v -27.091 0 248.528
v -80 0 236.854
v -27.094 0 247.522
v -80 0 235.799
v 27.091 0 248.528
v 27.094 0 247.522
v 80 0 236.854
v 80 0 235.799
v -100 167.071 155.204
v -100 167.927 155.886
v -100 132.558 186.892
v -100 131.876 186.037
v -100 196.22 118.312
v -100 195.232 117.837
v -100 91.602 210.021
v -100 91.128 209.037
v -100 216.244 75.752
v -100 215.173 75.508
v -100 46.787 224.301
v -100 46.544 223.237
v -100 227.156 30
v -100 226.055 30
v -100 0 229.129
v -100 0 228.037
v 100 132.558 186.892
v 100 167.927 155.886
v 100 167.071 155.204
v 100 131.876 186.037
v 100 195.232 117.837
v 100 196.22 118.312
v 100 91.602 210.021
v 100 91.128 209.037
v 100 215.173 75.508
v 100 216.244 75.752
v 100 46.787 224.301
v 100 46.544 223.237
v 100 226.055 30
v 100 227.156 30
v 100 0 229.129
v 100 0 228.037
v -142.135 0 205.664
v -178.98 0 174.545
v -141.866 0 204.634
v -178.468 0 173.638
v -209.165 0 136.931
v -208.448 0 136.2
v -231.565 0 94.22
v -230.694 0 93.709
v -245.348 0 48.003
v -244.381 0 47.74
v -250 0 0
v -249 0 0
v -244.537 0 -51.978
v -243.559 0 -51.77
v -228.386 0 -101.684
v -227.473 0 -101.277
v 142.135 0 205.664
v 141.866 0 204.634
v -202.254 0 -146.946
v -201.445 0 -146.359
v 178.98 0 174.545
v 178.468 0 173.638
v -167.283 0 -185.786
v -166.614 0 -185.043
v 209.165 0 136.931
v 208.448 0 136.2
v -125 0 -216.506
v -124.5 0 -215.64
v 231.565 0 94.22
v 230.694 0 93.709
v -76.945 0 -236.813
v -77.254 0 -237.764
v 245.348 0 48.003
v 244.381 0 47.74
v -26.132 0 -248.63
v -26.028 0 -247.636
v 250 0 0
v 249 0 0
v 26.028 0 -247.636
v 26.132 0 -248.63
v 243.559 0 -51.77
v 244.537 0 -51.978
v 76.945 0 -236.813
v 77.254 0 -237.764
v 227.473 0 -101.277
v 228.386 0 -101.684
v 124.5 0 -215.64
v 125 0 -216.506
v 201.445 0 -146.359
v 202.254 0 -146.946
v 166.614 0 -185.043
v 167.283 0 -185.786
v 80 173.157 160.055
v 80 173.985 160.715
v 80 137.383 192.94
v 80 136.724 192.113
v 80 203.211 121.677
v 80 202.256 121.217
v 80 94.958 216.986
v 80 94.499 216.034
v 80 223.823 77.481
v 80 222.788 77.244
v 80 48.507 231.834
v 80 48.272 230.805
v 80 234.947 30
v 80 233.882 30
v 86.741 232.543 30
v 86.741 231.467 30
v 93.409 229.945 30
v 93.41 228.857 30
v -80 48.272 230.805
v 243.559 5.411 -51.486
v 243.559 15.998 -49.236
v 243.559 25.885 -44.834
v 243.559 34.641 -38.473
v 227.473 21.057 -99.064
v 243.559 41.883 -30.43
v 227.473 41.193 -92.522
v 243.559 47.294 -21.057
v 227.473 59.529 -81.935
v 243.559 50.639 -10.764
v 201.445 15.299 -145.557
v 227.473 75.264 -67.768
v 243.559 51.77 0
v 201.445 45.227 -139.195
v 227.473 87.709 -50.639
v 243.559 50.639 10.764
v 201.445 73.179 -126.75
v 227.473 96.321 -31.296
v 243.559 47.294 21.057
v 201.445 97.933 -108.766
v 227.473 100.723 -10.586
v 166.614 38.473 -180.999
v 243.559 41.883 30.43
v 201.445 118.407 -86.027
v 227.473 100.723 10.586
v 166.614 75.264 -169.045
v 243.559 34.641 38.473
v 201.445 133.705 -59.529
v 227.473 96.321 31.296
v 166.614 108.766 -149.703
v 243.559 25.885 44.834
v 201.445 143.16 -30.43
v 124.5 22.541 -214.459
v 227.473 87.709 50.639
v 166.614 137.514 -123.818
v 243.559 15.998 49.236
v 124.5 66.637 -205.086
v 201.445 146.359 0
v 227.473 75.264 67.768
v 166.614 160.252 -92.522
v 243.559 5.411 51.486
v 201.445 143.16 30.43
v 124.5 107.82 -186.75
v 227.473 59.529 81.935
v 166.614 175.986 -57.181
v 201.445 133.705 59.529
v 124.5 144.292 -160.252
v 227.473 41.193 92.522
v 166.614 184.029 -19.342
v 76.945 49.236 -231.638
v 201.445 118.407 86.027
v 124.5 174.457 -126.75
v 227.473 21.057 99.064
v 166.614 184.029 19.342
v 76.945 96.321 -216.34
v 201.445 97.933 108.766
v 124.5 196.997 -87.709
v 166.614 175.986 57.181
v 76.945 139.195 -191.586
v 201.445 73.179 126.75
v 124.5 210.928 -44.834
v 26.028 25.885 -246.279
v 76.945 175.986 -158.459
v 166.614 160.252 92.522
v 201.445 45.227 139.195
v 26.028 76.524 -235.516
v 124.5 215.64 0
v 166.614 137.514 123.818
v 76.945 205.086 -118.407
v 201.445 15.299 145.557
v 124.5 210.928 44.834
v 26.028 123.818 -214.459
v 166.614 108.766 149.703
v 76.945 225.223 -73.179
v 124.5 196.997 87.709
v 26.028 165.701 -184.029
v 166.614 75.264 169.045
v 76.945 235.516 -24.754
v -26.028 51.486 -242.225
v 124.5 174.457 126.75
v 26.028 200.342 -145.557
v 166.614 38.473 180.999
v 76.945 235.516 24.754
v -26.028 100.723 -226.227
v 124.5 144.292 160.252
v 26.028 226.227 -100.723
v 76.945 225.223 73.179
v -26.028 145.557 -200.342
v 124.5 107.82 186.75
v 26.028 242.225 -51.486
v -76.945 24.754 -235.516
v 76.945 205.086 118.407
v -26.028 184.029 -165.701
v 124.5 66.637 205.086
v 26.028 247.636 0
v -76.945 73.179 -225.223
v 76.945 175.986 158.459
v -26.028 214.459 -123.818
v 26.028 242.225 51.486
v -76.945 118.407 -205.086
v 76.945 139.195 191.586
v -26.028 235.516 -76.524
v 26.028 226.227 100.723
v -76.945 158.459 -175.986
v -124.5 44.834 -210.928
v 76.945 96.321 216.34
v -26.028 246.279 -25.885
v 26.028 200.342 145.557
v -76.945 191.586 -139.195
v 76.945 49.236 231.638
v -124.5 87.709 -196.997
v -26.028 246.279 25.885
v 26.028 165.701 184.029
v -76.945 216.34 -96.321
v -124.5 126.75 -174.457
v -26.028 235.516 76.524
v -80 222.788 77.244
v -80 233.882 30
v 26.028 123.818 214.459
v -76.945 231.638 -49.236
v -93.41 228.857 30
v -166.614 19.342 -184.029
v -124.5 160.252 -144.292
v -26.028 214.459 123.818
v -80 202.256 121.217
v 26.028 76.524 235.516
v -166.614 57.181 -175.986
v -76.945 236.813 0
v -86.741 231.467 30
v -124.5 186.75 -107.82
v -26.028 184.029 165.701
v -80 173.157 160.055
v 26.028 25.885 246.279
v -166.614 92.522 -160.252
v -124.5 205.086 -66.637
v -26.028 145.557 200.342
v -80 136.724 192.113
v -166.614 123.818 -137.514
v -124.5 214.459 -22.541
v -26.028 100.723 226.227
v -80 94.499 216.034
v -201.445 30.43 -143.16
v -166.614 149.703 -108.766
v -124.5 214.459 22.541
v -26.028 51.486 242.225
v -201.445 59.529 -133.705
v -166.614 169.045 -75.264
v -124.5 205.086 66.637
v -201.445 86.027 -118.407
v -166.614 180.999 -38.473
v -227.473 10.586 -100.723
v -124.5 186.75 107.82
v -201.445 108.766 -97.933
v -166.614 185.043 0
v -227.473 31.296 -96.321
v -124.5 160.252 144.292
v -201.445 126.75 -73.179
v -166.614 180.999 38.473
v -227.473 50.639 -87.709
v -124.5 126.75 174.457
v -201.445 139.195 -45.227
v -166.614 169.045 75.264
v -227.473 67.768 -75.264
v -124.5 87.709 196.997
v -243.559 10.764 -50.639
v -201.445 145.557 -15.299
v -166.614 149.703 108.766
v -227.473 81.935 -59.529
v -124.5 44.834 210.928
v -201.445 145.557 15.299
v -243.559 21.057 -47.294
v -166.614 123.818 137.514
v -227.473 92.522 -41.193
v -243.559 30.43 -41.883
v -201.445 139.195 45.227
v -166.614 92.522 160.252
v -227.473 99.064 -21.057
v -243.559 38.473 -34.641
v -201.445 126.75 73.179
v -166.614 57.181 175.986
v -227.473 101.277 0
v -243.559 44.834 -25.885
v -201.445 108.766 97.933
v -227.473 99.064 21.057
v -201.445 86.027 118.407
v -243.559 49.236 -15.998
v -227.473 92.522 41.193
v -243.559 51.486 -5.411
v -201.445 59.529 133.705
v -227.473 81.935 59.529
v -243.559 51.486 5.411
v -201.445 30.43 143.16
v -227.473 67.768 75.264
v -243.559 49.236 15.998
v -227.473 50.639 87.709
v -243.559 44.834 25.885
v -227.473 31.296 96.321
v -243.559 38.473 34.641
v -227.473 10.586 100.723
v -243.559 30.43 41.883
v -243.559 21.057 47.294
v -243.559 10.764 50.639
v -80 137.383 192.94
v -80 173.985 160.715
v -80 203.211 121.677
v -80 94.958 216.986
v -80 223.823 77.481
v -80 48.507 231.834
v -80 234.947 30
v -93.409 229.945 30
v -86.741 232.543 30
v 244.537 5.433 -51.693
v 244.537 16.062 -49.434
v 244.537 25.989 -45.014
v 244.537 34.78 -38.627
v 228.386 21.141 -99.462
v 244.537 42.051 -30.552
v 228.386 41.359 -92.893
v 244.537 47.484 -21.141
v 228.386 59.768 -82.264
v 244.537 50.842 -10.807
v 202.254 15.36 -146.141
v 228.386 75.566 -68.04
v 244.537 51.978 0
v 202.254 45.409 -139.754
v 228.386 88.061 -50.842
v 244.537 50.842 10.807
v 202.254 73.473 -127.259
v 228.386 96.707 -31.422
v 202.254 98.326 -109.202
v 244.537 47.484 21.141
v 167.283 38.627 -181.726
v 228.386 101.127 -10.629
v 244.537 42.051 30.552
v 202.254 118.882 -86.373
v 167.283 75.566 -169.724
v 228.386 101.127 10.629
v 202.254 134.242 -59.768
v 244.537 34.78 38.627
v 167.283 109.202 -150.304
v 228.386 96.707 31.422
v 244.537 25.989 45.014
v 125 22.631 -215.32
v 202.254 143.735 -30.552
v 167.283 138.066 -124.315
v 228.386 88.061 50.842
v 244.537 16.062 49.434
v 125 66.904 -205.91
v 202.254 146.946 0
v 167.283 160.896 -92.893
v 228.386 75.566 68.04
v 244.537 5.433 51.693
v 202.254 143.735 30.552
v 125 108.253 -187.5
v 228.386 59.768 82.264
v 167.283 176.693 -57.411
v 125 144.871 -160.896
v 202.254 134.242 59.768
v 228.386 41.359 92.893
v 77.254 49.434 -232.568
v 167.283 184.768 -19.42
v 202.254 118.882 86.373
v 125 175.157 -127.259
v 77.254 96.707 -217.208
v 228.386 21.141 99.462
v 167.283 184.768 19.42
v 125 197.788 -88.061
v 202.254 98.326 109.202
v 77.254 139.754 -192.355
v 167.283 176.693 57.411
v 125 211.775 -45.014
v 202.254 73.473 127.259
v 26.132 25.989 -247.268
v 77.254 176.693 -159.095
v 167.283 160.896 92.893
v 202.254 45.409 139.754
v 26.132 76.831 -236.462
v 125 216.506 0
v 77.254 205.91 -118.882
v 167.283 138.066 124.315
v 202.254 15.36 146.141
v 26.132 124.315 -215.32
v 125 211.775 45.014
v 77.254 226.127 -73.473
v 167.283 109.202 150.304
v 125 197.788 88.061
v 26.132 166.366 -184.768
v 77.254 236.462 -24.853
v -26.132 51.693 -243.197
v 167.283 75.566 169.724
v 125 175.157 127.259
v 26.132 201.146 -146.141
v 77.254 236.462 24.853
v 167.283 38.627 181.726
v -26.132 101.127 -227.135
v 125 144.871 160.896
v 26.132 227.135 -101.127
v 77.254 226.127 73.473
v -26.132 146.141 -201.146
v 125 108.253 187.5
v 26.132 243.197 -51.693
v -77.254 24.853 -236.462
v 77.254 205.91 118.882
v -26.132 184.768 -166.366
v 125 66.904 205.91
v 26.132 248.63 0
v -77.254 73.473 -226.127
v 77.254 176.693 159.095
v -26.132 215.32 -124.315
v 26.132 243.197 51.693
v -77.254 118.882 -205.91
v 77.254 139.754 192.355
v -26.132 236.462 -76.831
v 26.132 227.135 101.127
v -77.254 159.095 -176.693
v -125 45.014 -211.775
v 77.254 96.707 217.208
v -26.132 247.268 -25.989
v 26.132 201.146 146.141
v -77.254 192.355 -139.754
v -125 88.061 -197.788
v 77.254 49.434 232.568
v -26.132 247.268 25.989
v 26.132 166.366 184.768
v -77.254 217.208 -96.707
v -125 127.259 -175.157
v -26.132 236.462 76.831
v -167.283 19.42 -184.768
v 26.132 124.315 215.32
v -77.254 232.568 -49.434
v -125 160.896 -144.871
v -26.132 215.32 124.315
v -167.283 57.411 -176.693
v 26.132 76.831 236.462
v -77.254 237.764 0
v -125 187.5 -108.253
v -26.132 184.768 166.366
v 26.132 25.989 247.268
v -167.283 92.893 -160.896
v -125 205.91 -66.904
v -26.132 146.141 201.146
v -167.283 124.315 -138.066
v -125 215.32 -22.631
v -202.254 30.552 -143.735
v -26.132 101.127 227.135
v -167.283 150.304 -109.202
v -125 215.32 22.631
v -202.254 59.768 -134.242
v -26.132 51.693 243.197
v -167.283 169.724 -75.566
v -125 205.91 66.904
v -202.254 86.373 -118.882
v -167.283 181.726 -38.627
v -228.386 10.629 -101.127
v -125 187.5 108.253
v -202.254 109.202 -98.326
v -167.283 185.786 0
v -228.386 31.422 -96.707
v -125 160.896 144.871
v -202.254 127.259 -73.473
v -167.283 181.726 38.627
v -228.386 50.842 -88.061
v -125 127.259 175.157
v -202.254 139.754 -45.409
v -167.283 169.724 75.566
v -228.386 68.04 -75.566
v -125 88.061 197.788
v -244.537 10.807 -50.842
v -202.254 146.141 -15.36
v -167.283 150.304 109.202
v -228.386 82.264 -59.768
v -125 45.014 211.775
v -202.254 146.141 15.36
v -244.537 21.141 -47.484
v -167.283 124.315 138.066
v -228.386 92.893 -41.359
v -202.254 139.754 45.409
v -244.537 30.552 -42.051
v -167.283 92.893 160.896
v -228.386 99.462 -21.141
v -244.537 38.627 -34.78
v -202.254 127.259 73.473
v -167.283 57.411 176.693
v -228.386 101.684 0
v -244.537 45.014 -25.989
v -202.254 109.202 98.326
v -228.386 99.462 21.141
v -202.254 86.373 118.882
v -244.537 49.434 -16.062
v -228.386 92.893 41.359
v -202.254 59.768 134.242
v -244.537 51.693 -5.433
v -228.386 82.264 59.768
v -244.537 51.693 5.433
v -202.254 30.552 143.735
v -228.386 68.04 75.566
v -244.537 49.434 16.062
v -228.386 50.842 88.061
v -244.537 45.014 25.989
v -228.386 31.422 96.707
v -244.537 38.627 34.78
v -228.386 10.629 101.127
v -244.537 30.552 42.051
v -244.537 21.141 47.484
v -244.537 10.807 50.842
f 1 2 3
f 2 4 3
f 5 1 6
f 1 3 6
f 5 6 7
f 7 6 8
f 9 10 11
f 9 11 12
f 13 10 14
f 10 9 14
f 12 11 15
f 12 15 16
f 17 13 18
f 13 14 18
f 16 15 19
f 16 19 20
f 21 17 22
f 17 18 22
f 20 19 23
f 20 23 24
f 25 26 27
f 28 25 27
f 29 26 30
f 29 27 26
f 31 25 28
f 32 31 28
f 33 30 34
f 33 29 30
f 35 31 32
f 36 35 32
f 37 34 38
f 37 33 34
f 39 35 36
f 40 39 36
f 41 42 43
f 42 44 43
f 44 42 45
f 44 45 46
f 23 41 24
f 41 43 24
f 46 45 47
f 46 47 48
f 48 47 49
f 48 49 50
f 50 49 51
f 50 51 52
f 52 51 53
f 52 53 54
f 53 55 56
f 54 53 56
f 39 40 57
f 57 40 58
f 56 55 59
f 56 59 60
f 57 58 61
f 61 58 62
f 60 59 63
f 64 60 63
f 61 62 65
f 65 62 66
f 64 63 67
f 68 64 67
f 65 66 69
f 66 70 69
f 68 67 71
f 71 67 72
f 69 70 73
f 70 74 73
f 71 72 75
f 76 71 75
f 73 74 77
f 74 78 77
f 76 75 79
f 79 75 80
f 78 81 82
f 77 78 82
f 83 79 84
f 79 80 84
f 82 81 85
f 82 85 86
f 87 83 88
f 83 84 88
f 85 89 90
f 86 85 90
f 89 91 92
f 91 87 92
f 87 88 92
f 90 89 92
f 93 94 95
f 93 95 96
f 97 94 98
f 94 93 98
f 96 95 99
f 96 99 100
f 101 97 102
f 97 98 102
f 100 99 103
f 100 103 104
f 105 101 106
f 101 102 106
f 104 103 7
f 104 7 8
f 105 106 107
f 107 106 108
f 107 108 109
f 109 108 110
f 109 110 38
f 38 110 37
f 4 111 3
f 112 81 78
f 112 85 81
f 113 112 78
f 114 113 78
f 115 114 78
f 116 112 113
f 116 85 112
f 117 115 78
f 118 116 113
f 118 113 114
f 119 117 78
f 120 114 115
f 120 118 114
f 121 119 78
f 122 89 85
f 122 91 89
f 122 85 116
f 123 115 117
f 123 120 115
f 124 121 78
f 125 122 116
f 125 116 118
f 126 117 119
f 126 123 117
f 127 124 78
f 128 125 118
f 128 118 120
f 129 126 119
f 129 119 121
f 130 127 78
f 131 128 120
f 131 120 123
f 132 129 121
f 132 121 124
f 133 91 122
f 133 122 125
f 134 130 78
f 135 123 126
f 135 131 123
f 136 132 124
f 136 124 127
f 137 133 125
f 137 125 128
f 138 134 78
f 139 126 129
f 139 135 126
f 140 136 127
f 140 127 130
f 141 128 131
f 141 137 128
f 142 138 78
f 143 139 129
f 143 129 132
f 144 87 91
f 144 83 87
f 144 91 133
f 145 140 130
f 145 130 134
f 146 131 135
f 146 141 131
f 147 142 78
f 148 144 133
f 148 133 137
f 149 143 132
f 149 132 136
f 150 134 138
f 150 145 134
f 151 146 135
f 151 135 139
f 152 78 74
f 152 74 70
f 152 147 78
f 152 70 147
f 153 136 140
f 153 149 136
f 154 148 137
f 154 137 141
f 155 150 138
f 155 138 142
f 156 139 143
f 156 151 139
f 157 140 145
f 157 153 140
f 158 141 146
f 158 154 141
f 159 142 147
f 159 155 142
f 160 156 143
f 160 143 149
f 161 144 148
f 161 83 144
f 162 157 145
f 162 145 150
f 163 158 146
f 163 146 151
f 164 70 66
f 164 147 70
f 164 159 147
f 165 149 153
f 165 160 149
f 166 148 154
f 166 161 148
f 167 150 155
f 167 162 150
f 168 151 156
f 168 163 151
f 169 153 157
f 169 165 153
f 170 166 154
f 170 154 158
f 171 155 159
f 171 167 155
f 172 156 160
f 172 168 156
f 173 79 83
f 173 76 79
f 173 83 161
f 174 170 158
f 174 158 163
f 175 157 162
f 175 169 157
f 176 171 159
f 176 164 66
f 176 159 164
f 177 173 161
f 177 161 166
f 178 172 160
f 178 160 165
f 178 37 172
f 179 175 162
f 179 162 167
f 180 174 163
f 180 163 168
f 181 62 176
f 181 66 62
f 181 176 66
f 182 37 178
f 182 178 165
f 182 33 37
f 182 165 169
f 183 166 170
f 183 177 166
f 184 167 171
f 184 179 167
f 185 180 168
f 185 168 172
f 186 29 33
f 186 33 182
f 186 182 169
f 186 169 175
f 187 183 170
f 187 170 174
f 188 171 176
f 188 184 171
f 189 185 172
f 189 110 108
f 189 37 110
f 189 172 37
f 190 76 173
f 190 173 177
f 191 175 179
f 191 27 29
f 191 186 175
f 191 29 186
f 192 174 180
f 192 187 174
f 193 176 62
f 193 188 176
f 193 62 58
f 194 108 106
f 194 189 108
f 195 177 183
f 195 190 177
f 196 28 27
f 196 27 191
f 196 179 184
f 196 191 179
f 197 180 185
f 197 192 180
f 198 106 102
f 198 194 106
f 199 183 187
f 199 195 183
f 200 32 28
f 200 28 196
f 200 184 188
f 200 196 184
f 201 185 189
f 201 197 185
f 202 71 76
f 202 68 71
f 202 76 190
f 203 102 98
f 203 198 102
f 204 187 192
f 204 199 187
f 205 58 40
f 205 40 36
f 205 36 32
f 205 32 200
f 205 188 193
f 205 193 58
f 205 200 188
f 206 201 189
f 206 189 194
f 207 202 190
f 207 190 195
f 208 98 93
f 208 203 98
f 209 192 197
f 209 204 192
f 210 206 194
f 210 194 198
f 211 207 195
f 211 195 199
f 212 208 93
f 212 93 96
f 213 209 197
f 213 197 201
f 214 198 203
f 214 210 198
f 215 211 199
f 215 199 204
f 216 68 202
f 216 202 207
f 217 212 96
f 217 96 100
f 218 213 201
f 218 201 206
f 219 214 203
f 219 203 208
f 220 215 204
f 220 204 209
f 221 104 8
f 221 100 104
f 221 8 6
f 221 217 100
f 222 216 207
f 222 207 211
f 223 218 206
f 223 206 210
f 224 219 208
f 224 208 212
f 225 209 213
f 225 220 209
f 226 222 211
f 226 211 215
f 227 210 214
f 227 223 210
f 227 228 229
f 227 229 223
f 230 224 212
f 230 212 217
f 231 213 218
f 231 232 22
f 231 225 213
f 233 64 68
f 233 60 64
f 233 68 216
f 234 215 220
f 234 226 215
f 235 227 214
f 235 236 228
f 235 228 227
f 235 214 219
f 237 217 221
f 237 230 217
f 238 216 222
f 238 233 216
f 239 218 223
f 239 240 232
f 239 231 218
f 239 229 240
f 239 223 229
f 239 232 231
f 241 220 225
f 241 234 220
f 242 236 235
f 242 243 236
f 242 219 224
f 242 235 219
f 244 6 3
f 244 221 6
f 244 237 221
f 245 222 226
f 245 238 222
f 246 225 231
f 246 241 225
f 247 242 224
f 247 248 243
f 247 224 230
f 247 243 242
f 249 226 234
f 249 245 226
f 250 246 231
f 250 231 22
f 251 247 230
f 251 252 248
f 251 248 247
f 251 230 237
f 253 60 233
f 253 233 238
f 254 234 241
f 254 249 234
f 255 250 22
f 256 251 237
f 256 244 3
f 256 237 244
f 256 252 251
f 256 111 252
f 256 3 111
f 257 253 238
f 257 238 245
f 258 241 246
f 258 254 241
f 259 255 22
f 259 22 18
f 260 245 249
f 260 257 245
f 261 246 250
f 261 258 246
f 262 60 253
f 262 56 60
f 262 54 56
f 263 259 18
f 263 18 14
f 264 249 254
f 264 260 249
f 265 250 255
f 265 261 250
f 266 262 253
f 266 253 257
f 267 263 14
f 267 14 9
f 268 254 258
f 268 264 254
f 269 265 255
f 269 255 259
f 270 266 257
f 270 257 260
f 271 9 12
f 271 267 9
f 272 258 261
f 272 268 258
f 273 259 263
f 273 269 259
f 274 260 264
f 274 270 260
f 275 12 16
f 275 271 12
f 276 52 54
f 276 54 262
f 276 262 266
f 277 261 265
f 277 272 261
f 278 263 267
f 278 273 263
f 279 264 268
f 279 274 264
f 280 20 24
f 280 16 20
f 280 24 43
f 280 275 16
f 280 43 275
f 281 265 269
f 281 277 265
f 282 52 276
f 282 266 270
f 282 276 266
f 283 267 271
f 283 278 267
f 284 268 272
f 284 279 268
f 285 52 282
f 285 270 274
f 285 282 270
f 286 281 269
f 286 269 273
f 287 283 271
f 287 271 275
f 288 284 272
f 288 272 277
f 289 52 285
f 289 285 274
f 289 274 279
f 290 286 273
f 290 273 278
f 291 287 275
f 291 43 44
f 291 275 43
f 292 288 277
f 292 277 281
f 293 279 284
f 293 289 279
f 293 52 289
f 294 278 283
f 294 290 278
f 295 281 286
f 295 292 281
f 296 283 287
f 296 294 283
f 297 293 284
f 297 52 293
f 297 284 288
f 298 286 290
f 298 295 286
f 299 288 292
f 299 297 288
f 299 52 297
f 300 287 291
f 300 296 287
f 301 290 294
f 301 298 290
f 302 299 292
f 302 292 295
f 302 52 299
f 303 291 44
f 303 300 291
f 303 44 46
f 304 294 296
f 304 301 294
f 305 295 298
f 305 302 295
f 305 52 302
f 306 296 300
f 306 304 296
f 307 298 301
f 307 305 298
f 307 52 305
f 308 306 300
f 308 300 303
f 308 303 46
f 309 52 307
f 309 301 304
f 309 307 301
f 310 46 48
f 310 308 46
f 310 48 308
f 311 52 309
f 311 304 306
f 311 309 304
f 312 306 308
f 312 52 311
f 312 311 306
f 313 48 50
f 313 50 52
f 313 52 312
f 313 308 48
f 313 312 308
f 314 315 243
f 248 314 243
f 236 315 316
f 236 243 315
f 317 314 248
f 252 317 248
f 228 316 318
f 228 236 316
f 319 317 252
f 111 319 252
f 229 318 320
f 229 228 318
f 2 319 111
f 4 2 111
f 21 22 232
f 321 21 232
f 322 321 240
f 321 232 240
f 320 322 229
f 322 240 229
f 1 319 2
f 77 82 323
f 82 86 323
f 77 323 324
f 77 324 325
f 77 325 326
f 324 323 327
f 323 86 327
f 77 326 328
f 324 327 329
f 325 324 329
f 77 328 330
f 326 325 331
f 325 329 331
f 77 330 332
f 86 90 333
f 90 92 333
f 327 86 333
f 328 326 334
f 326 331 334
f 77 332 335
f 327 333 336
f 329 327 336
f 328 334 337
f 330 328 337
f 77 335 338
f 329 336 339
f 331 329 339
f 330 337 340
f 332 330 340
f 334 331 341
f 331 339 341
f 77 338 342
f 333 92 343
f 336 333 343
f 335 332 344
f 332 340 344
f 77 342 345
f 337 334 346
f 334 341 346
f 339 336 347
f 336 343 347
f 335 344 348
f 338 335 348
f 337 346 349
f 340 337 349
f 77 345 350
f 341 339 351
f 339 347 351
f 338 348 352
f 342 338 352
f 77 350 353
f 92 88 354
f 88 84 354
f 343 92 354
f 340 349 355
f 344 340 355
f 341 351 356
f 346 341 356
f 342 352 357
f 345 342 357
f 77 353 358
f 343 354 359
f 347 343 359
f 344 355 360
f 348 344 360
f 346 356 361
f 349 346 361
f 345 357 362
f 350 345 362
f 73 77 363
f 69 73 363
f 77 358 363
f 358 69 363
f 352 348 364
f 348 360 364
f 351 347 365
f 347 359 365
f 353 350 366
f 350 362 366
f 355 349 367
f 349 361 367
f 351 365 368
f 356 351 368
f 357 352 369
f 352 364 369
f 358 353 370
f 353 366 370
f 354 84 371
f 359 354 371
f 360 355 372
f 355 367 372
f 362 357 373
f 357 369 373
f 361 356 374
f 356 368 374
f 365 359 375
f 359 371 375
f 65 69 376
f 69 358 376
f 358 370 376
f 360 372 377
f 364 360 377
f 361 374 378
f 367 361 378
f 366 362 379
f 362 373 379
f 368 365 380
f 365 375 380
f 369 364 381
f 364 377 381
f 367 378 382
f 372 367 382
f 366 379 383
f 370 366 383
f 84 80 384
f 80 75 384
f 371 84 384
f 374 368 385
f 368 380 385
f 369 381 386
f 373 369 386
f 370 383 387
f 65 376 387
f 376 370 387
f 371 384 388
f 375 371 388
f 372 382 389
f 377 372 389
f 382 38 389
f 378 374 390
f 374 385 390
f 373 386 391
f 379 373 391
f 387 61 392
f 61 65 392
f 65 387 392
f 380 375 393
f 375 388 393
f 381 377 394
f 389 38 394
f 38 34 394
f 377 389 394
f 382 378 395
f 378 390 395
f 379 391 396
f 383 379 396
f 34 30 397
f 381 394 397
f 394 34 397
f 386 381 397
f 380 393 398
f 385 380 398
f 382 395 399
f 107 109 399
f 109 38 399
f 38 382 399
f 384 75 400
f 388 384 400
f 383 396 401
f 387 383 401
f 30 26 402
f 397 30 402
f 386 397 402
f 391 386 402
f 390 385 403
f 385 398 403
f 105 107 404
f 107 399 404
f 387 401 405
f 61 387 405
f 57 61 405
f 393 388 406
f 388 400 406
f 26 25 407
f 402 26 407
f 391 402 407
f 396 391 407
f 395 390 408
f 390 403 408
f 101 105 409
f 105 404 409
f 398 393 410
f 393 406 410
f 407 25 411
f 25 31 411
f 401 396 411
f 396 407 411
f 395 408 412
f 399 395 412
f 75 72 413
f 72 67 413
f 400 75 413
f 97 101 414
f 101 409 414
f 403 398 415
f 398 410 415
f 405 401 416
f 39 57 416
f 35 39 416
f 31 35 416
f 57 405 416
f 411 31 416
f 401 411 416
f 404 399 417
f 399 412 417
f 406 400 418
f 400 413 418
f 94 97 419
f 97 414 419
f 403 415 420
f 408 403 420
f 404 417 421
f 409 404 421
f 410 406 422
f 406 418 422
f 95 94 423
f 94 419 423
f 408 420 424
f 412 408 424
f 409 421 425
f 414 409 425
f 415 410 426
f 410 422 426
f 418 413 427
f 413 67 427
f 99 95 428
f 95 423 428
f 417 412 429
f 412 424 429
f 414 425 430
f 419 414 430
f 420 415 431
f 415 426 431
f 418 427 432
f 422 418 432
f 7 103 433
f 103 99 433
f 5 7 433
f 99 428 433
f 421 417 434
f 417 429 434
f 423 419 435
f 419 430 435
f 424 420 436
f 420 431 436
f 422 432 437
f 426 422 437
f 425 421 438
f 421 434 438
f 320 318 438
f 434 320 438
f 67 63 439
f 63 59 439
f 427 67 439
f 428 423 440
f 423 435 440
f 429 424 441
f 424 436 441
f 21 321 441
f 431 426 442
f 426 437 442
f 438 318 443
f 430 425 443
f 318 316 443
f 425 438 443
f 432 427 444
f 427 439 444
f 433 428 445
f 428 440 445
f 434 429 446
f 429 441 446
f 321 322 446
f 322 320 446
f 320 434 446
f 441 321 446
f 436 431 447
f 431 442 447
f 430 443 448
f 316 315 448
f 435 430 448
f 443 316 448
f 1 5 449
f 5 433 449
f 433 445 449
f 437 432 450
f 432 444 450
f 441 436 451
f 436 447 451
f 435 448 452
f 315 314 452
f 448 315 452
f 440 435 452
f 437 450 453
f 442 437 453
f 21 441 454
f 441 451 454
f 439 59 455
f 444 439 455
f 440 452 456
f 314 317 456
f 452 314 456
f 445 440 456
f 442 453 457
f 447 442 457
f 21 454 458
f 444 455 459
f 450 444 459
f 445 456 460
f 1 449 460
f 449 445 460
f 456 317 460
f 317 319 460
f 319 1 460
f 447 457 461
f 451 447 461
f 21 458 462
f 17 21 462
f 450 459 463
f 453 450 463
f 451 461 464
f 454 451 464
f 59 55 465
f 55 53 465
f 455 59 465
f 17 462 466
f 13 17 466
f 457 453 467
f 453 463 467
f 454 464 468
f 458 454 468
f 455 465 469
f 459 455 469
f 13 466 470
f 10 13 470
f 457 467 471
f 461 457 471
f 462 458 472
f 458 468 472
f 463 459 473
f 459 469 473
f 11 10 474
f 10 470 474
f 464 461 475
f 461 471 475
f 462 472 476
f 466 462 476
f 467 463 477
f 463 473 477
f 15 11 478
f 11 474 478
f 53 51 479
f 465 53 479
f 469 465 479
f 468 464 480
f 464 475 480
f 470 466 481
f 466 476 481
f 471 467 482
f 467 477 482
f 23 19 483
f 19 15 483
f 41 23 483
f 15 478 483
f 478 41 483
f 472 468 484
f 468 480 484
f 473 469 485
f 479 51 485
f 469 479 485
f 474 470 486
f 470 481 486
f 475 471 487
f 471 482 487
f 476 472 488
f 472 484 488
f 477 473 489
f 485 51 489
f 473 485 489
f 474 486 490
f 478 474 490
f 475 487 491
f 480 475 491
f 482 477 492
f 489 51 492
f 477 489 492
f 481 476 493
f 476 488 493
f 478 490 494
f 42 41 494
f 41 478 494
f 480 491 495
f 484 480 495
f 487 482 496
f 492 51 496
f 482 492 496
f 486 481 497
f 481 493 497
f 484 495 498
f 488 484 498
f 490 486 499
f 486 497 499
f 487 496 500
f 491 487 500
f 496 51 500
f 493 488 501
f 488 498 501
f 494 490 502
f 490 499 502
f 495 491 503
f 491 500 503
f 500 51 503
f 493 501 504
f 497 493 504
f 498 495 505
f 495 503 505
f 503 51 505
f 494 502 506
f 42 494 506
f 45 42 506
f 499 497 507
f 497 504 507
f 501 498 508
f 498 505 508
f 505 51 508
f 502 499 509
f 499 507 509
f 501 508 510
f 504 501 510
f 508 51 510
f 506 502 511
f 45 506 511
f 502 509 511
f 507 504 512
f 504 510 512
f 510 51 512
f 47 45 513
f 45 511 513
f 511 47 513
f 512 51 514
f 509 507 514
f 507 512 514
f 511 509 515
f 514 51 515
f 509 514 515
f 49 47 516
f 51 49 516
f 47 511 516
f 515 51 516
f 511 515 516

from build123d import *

# Parameters (mm, degrees)
REVOLVE_1_ANGLE     = 180
SHELL_1_T           = -1
SKETCH_2_W          = 20
SKETCH_2_H          = 220
CUT_EXTRUDE_1_DEPTH = 434.012701892


with BuildPart() as part:
    # Эскиз1 → Повернуть1 (revolve)
    with BuildSketch(Plane(origin=(0, 0, 0), x_dir=(1, 0, 0), z_dir=(0, 1, 0))):
        with BuildLine():
            Line((-250, 0), (250, 0))
            ThreePointArc((250, 0), (0, 250), (-250, 0))
        make_face()
    revolve(axis=Axis((-250, 0, 0), (1, 0, 0)), revolution_arc=REVOLVE_1_ANGLE)

    # Оболочка1
    shell_1_openings = [part.faces().sort_by_distance(p)[0] for p in [
        (0, 0, 0),
    ]]
    offset(amount=SHELL_1_T, openings=shell_1_openings)

    # Эскиз2 → Вырез-Вытянуть1 (cut, through all)
    with BuildSketch(Plane(origin=(0, 0, 0), x_dir=(1, 0, 0), z_dir=(0, 1, 0))):
        with Locations((-90, -140)):
            Rectangle(SKETCH_2_W, SKETCH_2_H)
        with Locations((90, -140)):
            Rectangle(SKETCH_2_W, SKETCH_2_H)
    extrude(amount=CUT_EXTRUDE_1_DEPTH, mode=Mode.SUBTRACT)


solid = part.part
